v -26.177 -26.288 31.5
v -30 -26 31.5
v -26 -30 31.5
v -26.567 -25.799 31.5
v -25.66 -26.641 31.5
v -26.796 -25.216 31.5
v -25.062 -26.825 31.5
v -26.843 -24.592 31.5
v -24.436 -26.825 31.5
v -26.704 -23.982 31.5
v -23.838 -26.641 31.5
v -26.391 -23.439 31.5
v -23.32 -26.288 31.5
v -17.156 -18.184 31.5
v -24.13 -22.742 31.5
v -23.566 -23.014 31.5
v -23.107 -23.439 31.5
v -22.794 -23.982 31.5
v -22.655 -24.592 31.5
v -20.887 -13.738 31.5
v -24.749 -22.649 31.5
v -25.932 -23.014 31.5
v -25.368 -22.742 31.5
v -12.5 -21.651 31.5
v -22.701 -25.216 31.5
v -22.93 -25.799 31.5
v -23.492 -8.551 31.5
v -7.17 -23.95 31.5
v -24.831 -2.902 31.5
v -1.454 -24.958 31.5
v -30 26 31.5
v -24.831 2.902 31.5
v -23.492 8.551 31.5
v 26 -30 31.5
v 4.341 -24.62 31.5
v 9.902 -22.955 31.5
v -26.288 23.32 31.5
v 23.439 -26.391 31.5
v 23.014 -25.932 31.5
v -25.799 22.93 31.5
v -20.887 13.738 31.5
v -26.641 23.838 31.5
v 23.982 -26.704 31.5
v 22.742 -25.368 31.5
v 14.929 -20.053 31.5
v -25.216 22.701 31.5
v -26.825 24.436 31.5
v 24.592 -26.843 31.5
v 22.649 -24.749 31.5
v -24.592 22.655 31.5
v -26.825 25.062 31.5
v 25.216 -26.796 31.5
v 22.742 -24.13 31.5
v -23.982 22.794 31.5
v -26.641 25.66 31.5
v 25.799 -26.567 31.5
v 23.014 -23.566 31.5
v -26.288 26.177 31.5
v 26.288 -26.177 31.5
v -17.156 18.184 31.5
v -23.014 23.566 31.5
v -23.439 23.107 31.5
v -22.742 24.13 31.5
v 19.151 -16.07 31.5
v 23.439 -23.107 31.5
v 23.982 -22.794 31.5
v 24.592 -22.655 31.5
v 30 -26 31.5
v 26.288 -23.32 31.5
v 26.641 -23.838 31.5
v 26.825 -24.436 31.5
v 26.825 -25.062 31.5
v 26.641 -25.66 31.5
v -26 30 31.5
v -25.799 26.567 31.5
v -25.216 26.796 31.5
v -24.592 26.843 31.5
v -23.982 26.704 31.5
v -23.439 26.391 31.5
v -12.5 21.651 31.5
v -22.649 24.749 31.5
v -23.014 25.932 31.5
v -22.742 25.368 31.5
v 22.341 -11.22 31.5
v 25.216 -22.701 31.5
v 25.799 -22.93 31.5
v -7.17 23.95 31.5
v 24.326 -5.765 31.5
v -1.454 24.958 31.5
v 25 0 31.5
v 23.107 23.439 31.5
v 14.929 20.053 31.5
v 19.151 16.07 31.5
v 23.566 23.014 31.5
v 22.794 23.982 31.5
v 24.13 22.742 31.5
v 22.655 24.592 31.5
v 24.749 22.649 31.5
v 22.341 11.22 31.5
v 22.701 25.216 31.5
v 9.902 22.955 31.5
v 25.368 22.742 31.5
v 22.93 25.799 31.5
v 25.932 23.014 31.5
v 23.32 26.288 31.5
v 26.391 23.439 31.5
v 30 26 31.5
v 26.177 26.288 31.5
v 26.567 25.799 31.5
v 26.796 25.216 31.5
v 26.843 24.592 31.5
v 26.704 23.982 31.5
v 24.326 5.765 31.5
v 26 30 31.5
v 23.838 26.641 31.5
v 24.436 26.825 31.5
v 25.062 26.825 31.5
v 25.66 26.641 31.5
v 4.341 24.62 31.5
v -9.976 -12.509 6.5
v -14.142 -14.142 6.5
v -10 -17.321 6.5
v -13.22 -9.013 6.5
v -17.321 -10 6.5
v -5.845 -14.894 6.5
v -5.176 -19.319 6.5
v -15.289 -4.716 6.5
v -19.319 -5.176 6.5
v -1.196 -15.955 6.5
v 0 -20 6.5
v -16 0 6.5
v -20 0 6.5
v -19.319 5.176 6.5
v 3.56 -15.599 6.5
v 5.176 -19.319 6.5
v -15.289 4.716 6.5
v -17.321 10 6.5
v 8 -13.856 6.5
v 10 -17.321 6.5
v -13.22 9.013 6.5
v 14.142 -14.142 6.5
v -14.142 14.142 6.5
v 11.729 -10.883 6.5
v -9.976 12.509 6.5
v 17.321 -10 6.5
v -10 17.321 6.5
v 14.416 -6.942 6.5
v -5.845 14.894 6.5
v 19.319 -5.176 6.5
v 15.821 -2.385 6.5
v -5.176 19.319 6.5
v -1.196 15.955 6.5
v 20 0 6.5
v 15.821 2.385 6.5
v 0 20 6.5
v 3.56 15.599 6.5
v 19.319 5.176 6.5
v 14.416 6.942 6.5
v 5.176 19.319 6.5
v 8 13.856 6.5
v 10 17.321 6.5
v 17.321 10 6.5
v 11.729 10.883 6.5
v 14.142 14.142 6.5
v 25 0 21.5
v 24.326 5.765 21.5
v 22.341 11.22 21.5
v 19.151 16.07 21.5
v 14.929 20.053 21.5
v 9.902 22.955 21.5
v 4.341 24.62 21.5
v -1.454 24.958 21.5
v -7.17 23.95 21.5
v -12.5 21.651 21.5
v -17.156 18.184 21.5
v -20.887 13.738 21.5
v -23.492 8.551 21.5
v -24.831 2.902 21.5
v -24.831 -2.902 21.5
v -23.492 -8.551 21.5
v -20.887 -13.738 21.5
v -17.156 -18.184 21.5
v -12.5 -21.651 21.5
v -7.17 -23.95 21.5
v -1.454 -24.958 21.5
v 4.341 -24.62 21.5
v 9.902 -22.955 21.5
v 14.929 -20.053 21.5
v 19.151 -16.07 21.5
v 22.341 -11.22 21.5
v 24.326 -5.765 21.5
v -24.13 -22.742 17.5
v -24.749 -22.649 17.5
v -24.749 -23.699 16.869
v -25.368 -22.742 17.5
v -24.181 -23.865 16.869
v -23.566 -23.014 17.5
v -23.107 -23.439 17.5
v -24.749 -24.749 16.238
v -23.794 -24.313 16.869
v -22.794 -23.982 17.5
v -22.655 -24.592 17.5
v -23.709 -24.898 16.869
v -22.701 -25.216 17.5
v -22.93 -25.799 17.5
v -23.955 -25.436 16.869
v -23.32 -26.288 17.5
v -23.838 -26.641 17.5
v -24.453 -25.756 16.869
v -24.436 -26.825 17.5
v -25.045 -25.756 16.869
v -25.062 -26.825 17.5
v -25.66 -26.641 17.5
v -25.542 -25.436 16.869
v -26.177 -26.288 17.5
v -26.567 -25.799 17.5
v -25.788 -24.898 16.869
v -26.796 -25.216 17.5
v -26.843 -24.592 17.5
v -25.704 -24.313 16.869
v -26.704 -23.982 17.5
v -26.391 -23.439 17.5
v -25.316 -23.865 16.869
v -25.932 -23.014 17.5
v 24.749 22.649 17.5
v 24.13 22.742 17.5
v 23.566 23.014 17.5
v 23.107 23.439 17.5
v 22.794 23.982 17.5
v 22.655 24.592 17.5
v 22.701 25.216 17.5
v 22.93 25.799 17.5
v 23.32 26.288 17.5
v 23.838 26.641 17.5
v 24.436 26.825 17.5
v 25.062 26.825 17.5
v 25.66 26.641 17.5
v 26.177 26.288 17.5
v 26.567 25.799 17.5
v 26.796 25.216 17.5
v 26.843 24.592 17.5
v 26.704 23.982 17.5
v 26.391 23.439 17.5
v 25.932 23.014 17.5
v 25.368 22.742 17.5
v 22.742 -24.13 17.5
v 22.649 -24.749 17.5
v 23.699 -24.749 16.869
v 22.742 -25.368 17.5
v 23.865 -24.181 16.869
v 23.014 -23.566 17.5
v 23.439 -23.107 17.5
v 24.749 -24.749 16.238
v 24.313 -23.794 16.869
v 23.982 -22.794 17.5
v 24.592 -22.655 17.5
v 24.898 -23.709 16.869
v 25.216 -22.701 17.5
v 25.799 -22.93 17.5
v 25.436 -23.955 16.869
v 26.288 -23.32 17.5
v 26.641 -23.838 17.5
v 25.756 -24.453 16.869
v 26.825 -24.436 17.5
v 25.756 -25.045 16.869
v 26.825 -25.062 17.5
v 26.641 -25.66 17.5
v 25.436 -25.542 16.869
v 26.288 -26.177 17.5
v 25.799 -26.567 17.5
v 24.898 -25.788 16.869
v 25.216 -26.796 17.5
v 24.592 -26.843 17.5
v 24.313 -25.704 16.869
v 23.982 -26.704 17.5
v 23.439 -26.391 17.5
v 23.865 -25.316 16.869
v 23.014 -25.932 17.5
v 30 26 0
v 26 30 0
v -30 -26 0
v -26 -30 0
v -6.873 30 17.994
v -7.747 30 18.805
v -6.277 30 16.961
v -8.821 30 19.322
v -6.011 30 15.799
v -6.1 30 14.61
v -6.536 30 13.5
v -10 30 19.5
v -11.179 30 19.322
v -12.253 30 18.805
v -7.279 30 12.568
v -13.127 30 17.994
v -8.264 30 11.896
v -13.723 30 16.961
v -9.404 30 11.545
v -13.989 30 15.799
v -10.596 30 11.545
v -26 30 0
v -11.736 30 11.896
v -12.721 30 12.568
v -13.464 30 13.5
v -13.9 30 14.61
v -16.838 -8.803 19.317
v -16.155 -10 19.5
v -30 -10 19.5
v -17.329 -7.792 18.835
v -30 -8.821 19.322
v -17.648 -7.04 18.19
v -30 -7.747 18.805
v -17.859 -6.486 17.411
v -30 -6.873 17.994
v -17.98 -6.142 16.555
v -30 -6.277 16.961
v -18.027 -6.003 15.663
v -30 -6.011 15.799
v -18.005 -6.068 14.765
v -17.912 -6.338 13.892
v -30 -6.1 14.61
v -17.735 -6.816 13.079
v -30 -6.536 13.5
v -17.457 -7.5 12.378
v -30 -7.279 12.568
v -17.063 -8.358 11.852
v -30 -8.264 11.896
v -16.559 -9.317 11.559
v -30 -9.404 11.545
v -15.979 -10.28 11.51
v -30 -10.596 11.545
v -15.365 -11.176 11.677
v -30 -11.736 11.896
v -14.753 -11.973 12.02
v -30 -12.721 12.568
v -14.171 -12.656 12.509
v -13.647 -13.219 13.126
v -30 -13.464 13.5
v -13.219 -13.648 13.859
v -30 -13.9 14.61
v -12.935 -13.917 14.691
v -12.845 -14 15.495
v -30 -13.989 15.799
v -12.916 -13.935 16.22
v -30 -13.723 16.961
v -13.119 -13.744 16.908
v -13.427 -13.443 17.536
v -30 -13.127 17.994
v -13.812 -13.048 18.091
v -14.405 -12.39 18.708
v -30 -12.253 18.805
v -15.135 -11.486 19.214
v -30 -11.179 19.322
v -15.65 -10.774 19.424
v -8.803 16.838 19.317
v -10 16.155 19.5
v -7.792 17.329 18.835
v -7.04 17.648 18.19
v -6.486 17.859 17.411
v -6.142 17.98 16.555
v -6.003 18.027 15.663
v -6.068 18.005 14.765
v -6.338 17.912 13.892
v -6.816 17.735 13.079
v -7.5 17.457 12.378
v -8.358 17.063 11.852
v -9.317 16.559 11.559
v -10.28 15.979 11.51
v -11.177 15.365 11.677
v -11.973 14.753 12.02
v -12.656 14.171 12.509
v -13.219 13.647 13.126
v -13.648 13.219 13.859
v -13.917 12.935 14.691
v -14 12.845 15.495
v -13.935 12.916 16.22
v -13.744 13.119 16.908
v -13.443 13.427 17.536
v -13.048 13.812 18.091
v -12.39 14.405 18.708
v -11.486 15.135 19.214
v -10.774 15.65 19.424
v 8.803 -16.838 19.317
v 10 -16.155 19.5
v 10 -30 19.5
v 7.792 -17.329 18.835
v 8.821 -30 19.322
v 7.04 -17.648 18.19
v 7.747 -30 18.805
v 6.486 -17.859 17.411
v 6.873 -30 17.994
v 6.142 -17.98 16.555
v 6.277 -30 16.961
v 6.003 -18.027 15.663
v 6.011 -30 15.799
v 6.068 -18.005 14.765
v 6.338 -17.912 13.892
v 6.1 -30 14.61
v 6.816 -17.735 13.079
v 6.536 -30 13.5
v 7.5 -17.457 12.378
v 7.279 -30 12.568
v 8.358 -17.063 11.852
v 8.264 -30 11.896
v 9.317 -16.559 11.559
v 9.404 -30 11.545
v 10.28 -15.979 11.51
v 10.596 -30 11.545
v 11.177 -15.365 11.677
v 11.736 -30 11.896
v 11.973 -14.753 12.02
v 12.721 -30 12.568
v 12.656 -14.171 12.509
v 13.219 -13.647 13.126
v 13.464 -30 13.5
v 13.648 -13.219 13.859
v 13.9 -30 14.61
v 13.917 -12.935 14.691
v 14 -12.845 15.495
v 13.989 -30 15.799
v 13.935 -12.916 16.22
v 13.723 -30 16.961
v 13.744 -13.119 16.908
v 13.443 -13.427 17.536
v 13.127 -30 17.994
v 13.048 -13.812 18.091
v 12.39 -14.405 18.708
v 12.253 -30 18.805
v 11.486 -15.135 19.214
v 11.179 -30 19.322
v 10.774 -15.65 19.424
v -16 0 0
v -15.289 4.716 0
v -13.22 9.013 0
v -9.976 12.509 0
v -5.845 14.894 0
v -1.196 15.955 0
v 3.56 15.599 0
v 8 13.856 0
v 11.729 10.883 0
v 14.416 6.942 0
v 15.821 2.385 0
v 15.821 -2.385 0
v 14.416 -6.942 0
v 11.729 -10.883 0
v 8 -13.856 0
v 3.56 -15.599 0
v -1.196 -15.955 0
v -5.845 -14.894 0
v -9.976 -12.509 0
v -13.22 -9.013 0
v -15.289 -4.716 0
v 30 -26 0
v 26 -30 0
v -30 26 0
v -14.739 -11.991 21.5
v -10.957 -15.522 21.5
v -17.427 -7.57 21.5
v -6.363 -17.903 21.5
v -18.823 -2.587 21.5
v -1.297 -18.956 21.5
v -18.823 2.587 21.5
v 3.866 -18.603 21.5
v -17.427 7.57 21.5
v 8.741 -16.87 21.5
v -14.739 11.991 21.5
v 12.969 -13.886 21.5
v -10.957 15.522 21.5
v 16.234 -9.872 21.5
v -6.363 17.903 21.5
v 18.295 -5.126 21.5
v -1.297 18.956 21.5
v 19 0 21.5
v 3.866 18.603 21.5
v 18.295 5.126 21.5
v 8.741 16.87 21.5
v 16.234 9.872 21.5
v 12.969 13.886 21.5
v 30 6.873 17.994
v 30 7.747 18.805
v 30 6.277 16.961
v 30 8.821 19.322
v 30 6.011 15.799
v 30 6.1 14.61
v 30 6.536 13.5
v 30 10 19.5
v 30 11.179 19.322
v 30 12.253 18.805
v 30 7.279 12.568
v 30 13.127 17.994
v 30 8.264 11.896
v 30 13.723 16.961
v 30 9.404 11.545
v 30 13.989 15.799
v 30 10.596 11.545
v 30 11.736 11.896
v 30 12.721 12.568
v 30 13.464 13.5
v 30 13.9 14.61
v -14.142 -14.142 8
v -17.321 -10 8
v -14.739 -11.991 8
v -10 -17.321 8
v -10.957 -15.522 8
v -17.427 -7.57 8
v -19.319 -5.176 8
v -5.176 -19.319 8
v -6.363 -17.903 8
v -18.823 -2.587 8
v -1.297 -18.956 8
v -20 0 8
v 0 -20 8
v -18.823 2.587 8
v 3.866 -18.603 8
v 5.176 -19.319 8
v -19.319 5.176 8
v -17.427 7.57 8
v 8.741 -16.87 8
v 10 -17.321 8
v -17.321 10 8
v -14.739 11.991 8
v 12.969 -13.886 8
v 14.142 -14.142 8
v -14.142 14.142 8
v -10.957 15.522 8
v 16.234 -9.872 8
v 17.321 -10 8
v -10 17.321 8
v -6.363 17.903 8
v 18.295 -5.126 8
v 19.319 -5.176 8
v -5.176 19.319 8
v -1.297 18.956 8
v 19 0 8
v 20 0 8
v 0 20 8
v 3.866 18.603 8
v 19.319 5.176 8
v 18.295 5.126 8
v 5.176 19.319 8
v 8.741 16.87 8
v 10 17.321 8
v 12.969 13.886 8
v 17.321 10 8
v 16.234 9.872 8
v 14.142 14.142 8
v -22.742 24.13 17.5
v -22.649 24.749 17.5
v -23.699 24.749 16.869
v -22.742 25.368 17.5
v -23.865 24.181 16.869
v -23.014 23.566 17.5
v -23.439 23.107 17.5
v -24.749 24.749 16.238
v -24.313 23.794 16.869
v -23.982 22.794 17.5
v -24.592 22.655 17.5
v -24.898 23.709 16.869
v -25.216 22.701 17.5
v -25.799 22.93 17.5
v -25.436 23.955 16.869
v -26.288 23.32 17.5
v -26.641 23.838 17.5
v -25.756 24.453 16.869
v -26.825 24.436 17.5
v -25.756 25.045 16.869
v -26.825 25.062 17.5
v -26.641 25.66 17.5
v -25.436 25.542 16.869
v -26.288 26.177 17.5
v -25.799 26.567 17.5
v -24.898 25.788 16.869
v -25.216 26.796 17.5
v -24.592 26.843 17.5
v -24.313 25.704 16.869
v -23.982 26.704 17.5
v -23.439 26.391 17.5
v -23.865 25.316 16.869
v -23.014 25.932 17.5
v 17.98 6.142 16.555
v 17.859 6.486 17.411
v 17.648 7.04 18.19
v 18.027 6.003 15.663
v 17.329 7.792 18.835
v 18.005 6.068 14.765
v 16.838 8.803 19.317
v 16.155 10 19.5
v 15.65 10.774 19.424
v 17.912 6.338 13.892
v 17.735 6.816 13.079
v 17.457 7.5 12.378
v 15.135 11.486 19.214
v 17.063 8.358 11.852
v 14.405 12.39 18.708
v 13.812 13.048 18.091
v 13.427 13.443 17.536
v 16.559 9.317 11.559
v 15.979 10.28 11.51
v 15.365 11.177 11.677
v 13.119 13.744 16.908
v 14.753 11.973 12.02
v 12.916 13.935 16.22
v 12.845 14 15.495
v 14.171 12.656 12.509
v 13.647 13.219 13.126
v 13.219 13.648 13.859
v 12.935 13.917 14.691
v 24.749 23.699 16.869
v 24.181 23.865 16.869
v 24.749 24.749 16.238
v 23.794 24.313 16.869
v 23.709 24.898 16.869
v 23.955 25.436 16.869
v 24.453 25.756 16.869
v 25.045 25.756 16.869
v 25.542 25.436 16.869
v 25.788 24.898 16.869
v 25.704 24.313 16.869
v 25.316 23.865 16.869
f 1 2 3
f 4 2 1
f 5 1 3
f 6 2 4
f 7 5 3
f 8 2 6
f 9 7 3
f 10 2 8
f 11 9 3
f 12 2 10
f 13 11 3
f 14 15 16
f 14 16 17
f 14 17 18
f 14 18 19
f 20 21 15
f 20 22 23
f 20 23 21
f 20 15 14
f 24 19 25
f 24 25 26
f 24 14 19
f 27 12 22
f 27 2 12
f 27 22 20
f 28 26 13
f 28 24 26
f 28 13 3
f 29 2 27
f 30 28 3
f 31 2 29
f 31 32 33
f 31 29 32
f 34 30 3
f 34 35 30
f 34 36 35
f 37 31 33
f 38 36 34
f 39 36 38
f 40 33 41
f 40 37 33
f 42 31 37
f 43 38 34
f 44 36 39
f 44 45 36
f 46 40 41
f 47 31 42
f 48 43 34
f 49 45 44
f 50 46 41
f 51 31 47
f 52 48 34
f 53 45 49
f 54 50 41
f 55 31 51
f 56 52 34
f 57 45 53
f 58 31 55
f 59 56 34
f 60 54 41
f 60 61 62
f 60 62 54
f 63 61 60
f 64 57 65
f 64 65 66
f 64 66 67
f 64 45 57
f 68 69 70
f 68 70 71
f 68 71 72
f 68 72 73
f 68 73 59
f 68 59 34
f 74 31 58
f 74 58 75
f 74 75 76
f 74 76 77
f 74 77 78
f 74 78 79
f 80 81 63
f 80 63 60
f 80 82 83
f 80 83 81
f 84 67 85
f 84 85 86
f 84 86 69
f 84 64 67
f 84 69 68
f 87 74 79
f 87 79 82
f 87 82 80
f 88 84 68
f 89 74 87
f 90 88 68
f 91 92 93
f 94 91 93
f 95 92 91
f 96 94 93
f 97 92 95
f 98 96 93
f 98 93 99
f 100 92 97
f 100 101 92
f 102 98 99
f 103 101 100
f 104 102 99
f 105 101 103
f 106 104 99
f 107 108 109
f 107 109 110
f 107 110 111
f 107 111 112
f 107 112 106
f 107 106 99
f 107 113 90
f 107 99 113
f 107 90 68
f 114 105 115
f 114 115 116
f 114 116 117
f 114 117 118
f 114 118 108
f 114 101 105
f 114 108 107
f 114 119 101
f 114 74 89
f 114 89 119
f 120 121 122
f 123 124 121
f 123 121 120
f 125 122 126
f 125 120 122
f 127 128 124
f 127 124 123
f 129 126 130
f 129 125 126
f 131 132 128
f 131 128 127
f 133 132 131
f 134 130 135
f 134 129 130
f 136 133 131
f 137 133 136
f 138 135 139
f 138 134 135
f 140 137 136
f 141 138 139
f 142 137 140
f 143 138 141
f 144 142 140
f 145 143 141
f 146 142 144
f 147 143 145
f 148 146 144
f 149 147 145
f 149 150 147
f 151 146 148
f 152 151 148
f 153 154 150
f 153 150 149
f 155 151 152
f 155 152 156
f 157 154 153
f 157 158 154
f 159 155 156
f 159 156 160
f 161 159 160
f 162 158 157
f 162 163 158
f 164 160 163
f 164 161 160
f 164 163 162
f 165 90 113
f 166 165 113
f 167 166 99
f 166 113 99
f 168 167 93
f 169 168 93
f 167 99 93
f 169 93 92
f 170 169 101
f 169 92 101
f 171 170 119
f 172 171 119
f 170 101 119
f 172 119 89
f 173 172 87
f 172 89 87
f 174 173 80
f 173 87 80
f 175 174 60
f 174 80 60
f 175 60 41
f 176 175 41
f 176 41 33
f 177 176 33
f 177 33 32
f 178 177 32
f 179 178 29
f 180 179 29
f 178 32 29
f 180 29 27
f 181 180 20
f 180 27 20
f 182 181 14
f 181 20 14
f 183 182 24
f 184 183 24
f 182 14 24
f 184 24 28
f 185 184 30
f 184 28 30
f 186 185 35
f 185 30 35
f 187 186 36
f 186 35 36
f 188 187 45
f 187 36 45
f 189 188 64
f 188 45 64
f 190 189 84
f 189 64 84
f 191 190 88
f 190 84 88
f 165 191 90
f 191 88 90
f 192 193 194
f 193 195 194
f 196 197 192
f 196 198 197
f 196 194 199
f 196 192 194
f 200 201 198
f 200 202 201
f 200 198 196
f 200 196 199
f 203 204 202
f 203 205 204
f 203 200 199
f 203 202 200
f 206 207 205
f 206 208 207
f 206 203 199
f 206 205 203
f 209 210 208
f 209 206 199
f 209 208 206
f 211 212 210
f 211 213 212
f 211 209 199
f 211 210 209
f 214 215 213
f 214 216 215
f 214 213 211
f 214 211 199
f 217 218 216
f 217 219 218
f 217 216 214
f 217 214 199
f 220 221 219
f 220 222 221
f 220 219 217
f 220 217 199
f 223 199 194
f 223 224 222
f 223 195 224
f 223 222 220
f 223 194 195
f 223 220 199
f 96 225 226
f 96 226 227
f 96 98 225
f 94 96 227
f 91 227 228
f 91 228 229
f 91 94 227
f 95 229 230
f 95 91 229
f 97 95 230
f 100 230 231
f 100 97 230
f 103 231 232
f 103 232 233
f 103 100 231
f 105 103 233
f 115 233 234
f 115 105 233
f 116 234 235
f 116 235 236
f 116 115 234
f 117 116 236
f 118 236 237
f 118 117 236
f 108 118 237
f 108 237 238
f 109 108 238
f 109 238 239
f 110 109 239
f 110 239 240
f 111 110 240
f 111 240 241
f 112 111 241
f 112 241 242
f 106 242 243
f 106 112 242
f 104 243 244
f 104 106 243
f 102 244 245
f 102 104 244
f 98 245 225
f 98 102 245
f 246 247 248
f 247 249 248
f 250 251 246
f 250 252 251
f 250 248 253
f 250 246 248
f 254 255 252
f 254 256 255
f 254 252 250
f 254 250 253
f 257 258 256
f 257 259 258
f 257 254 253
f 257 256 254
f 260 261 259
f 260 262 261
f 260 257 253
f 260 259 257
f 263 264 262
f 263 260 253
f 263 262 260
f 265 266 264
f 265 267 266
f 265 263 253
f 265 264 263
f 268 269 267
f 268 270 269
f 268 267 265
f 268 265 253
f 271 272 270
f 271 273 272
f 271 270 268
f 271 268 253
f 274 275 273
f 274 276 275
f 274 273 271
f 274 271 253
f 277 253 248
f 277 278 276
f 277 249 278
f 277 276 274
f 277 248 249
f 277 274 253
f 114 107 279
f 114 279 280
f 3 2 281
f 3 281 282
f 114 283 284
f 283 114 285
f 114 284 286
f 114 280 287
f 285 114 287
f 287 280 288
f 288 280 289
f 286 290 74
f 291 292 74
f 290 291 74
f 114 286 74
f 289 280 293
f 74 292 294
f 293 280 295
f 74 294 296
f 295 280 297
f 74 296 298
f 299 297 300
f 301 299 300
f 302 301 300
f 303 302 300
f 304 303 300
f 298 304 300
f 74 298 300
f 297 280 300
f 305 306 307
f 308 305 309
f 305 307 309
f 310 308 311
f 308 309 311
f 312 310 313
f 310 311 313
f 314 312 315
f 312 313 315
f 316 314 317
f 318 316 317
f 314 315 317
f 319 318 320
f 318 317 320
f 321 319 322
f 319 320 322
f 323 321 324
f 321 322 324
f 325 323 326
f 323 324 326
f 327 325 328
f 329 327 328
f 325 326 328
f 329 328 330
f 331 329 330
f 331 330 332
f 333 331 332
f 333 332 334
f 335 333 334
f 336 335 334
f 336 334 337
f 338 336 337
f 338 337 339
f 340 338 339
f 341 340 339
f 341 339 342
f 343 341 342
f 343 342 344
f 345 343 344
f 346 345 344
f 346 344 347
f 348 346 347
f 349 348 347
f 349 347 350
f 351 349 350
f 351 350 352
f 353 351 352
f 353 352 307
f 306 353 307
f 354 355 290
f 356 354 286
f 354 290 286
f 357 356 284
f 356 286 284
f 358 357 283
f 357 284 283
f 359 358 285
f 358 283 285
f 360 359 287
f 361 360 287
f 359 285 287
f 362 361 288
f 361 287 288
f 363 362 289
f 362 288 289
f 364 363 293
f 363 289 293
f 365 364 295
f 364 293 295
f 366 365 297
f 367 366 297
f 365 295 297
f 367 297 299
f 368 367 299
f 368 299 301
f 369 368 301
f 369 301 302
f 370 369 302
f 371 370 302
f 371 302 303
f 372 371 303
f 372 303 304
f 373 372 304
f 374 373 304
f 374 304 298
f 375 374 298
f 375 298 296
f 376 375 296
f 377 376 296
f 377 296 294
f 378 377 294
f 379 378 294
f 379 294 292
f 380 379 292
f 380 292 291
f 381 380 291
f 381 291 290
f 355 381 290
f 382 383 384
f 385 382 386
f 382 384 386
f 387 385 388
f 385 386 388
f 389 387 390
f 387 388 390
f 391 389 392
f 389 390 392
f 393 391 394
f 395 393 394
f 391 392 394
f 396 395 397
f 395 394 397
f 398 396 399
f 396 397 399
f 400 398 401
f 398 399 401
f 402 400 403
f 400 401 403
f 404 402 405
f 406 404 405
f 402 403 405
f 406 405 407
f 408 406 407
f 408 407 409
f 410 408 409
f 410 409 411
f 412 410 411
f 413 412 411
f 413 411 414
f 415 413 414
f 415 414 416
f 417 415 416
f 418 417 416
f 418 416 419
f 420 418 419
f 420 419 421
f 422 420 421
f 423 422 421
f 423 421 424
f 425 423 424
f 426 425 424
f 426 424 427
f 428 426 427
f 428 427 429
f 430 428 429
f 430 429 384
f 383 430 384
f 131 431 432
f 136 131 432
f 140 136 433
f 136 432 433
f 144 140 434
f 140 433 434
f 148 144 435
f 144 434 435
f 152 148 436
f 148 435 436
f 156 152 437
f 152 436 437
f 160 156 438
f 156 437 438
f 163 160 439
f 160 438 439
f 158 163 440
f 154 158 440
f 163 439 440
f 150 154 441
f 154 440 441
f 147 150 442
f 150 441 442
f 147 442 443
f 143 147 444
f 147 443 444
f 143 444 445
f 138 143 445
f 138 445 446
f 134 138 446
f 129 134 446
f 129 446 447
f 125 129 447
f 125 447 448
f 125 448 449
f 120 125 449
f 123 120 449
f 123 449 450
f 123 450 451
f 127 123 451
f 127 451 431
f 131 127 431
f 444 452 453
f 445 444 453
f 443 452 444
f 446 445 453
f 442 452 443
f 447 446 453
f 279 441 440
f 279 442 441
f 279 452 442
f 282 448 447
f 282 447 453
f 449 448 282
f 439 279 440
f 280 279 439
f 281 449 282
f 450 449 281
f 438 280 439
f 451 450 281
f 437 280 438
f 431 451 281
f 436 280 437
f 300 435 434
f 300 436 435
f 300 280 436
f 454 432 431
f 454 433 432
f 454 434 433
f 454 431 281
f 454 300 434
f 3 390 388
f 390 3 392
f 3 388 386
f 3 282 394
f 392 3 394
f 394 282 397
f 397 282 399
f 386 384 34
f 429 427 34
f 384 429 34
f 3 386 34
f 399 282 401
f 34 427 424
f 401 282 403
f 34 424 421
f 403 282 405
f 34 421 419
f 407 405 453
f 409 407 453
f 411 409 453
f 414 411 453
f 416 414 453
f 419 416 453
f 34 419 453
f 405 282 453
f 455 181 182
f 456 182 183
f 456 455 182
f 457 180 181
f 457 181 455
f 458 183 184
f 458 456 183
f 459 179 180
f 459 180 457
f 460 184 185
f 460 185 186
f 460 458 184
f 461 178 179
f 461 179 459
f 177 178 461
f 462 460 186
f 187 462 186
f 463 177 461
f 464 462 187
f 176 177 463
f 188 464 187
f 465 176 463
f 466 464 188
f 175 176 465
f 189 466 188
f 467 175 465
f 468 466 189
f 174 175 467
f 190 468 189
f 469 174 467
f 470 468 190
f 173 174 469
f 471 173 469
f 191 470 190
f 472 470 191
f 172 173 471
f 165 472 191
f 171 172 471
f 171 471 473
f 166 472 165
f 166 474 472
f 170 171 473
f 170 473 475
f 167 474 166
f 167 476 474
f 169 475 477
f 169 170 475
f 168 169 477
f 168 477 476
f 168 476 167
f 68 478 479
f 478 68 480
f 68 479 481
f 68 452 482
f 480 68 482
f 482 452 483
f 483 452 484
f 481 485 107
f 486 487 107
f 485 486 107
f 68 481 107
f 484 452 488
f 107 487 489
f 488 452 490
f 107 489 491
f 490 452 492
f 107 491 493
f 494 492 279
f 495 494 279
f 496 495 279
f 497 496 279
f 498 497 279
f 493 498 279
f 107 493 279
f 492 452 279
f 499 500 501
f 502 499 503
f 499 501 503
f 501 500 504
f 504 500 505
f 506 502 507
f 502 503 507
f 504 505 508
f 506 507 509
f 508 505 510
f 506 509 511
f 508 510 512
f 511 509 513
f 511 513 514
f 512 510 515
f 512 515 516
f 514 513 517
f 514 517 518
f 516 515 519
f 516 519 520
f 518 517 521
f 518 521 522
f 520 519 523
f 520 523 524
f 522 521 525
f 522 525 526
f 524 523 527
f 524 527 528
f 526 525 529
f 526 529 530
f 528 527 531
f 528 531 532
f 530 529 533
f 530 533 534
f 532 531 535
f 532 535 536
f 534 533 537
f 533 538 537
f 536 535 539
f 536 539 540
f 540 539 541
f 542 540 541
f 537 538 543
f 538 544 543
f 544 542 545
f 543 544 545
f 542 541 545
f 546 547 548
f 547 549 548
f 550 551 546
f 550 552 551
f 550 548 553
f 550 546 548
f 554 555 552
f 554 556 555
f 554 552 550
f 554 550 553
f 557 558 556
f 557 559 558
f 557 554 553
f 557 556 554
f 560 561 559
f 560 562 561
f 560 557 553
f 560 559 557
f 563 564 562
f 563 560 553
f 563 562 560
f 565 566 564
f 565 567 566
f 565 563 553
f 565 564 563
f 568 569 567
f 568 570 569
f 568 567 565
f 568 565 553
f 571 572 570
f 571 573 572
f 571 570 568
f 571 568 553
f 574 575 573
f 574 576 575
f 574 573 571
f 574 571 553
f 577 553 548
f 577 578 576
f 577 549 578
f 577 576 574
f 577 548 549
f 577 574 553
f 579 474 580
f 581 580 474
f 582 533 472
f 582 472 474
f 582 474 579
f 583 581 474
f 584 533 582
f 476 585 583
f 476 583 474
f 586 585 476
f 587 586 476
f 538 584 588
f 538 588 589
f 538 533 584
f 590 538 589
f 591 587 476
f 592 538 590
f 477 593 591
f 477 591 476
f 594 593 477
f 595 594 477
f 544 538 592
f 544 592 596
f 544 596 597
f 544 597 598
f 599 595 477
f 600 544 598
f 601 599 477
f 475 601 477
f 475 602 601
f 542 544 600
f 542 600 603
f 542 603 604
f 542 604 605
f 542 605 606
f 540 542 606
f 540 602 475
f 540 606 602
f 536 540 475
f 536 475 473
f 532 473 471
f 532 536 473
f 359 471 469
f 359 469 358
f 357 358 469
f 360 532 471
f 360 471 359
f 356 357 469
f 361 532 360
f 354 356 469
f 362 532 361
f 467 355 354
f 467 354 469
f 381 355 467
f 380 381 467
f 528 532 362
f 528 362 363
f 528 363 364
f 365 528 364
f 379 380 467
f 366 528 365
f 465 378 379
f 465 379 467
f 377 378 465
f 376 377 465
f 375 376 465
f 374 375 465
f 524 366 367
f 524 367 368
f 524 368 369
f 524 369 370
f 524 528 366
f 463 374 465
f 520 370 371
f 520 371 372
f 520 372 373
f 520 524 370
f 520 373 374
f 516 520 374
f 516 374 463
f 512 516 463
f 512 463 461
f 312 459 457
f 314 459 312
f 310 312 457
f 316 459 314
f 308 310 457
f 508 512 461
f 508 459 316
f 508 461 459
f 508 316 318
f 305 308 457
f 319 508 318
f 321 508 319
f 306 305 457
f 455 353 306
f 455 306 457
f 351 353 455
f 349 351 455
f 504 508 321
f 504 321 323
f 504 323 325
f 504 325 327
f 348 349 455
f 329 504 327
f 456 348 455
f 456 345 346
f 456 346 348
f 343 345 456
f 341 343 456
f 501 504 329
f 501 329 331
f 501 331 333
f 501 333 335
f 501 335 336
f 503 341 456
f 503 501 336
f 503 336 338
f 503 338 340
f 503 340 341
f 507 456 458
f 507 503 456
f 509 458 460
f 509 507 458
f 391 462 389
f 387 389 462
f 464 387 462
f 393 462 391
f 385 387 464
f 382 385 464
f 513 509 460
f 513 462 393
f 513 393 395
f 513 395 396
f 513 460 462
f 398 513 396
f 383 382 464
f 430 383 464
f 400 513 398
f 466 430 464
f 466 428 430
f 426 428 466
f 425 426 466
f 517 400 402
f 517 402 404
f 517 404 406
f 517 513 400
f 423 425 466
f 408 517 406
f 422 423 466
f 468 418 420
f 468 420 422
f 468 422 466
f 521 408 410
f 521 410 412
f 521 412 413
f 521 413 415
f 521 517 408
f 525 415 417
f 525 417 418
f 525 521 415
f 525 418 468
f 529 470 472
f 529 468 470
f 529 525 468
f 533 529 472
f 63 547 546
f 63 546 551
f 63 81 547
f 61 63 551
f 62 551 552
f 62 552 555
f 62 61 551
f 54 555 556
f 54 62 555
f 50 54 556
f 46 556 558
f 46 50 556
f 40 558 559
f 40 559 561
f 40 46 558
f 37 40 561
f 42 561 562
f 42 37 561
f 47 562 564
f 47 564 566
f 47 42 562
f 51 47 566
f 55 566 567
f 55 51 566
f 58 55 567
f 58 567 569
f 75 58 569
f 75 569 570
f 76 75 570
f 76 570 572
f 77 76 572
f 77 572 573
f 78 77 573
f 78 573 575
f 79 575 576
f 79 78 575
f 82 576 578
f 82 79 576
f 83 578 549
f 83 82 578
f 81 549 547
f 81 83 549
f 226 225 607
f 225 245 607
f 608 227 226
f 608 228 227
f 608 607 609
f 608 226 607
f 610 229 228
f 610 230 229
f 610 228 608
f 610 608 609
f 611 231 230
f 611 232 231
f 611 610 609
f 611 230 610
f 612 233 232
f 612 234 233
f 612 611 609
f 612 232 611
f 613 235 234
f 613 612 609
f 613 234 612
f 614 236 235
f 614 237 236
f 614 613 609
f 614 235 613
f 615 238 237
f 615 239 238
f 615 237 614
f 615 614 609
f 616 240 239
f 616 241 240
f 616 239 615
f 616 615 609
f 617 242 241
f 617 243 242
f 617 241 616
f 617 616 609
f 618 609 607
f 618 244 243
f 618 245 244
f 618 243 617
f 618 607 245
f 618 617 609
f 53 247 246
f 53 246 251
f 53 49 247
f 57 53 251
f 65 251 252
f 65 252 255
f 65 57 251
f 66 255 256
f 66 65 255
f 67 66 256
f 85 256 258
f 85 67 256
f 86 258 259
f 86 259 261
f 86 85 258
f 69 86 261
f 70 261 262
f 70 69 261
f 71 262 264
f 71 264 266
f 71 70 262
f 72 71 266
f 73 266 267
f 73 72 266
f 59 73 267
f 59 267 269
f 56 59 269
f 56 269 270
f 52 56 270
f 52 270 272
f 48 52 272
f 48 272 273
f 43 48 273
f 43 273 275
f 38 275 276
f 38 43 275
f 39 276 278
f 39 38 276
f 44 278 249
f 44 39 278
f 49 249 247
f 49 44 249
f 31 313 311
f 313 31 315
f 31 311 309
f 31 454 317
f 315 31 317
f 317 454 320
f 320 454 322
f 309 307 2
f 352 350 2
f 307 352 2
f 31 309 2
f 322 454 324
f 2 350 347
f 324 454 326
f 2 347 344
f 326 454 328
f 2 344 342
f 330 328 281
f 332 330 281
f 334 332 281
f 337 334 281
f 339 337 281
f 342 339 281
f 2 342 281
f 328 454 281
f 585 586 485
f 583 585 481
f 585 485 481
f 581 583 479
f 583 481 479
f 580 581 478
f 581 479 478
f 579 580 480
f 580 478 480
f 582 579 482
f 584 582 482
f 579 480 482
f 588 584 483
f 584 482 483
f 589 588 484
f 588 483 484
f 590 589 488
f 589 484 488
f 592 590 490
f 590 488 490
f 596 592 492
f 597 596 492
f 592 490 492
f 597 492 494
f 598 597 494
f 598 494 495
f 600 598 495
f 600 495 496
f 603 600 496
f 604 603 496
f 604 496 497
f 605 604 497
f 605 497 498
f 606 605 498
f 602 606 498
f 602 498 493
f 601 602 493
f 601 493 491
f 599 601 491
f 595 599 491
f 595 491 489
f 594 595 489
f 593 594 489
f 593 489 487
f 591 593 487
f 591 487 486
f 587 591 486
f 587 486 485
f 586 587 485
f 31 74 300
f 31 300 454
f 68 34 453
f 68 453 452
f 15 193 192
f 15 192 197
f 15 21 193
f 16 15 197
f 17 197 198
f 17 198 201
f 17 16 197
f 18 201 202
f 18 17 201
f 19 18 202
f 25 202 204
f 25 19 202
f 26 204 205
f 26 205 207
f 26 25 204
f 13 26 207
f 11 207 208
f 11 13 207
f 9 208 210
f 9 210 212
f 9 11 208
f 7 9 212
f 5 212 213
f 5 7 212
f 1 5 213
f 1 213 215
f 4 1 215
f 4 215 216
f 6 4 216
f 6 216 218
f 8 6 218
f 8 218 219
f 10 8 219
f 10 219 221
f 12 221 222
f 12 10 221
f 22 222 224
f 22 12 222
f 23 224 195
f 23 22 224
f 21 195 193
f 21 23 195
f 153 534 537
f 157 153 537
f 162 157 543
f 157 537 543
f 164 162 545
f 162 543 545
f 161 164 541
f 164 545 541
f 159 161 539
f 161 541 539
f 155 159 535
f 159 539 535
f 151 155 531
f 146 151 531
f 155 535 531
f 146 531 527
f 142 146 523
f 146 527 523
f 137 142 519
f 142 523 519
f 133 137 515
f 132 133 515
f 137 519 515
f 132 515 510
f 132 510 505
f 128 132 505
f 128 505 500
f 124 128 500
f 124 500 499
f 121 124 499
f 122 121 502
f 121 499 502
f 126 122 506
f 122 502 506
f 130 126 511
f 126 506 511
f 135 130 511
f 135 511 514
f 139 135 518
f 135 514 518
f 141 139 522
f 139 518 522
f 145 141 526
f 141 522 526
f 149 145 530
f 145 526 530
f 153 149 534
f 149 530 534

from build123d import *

# Parameters (mm, degrees)
SKETCH_1_R               = 19
EXTRUDE_1_DEPTH          = 31.5
SKETCH_2_R               = 25
CUT_EXTRUDE_1_DEPTH      = 10
PATTERN_CIRCULAR_1_COUNT = 4
SKETCH_6_R               = 19
SKETCH_6_R_2             = 16
EXTRUDE_2_DEPTH          = 8
SKETCH_7_R               = 20
CUT_EXTRUDE_2_DEPTH      = 1.5
SKETCH_9_R               = 4
CUT_EXTRUDE_3_DEPTH      = 20
PATTERN_CIRCULAR_2_COUNT = 4


with BuildPart() as part:
    # 草图1 → 凸台-拉伸1 (new body)
    with BuildSketch(Plane.XY):
        Polygon((30, 26), (26, 30), (-26, 30), (-30, 26), (-30, -26), (-26, -30), (26, -30), (30, -26), align=None)
        Circle(SKETCH_1_R, mode=Mode.SUBTRACT)
    extrude(amount=EXTRUDE_1_DEPTH)

    # 草图2 → 切除-拉伸1 (cut)
    with BuildSketch(Plane.XY.offset(31.5)):
        Circle(SKETCH_2_R)
    extrude(amount=-CUT_EXTRUDE_1_DEPTH, mode=Mode.SUBTRACT)

    # 草图4 → M5 螺纹孔1 (revolve, cut)
    with BuildSketch(Plane(origin=(24.748737342, 24.748737342, 31.5), x_dir=(0, -1, 0), z_dir=(1, 0, 0))):
        Polygon((0, 0), (0, 15.2618073), (2.1, 14), (2.1, 0), align=None)
    hole_wizard_m5_1 = revolve(axis=Axis((24.748737342, 24.748737342, 37.85), (0, 0, -1)), mode=Mode.SUBTRACT)

    # 阵列(圆周)1: M5 螺纹孔1 ×4 about axis
    pattern_circular_1_axis = Axis((0, 0, 0), (0, 0, 1))
    for i in range(1, PATTERN_CIRCULAR_1_COUNT):
        add(hole_wizard_m5_1.rotate(pattern_circular_1_axis, i * 360 / PATTERN_CIRCULAR_1_COUNT), mode=Mode.SUBTRACT)

    # 草图6 → 凸台-拉伸2 (add)
    with BuildSketch(Plane(origin=(0, 0, 0), x_dir=(-1, 0, 0), z_dir=(0, 0, -1))):
        Circle(SKETCH_6_R)
        Circle(SKETCH_6_R_2, mode=Mode.SUBTRACT)
    extrude(amount=-EXTRUDE_2_DEPTH)

    # 草图7 → 切除-拉伸2 (cut)
    with BuildSketch(Plane.XY.offset(8)):
        Circle(SKETCH_7_R)
    extrude(amount=-CUT_EXTRUDE_2_DEPTH, mode=Mode.SUBTRACT)

    # 草图9 → 切除-拉伸3 (cut)
    with BuildSketch(Plane(origin=(0, 30, 0), x_dir=(1, 0, 0), z_dir=(0, 1, 0))):
        with Locations(Location((-10, -15.5, 0), (0, 0, 270))):
            Circle(SKETCH_9_R)
    cut_extrude_3 = extrude(amount=-CUT_EXTRUDE_3_DEPTH, mode=Mode.SUBTRACT)

    # 阵列(圆周)2: 切除-拉伸3 ×4 about axis
    pattern_circular_2_axis = Axis((0, 0, 31.5), (0, 0, -1))
    for i in range(1, PATTERN_CIRCULAR_2_COUNT):
        add(cut_extrude_3.rotate(pattern_circular_2_axis, i * 360 / PATTERN_CIRCULAR_2_COUNT), mode=Mode.SUBTRACT)


solid = part.part
